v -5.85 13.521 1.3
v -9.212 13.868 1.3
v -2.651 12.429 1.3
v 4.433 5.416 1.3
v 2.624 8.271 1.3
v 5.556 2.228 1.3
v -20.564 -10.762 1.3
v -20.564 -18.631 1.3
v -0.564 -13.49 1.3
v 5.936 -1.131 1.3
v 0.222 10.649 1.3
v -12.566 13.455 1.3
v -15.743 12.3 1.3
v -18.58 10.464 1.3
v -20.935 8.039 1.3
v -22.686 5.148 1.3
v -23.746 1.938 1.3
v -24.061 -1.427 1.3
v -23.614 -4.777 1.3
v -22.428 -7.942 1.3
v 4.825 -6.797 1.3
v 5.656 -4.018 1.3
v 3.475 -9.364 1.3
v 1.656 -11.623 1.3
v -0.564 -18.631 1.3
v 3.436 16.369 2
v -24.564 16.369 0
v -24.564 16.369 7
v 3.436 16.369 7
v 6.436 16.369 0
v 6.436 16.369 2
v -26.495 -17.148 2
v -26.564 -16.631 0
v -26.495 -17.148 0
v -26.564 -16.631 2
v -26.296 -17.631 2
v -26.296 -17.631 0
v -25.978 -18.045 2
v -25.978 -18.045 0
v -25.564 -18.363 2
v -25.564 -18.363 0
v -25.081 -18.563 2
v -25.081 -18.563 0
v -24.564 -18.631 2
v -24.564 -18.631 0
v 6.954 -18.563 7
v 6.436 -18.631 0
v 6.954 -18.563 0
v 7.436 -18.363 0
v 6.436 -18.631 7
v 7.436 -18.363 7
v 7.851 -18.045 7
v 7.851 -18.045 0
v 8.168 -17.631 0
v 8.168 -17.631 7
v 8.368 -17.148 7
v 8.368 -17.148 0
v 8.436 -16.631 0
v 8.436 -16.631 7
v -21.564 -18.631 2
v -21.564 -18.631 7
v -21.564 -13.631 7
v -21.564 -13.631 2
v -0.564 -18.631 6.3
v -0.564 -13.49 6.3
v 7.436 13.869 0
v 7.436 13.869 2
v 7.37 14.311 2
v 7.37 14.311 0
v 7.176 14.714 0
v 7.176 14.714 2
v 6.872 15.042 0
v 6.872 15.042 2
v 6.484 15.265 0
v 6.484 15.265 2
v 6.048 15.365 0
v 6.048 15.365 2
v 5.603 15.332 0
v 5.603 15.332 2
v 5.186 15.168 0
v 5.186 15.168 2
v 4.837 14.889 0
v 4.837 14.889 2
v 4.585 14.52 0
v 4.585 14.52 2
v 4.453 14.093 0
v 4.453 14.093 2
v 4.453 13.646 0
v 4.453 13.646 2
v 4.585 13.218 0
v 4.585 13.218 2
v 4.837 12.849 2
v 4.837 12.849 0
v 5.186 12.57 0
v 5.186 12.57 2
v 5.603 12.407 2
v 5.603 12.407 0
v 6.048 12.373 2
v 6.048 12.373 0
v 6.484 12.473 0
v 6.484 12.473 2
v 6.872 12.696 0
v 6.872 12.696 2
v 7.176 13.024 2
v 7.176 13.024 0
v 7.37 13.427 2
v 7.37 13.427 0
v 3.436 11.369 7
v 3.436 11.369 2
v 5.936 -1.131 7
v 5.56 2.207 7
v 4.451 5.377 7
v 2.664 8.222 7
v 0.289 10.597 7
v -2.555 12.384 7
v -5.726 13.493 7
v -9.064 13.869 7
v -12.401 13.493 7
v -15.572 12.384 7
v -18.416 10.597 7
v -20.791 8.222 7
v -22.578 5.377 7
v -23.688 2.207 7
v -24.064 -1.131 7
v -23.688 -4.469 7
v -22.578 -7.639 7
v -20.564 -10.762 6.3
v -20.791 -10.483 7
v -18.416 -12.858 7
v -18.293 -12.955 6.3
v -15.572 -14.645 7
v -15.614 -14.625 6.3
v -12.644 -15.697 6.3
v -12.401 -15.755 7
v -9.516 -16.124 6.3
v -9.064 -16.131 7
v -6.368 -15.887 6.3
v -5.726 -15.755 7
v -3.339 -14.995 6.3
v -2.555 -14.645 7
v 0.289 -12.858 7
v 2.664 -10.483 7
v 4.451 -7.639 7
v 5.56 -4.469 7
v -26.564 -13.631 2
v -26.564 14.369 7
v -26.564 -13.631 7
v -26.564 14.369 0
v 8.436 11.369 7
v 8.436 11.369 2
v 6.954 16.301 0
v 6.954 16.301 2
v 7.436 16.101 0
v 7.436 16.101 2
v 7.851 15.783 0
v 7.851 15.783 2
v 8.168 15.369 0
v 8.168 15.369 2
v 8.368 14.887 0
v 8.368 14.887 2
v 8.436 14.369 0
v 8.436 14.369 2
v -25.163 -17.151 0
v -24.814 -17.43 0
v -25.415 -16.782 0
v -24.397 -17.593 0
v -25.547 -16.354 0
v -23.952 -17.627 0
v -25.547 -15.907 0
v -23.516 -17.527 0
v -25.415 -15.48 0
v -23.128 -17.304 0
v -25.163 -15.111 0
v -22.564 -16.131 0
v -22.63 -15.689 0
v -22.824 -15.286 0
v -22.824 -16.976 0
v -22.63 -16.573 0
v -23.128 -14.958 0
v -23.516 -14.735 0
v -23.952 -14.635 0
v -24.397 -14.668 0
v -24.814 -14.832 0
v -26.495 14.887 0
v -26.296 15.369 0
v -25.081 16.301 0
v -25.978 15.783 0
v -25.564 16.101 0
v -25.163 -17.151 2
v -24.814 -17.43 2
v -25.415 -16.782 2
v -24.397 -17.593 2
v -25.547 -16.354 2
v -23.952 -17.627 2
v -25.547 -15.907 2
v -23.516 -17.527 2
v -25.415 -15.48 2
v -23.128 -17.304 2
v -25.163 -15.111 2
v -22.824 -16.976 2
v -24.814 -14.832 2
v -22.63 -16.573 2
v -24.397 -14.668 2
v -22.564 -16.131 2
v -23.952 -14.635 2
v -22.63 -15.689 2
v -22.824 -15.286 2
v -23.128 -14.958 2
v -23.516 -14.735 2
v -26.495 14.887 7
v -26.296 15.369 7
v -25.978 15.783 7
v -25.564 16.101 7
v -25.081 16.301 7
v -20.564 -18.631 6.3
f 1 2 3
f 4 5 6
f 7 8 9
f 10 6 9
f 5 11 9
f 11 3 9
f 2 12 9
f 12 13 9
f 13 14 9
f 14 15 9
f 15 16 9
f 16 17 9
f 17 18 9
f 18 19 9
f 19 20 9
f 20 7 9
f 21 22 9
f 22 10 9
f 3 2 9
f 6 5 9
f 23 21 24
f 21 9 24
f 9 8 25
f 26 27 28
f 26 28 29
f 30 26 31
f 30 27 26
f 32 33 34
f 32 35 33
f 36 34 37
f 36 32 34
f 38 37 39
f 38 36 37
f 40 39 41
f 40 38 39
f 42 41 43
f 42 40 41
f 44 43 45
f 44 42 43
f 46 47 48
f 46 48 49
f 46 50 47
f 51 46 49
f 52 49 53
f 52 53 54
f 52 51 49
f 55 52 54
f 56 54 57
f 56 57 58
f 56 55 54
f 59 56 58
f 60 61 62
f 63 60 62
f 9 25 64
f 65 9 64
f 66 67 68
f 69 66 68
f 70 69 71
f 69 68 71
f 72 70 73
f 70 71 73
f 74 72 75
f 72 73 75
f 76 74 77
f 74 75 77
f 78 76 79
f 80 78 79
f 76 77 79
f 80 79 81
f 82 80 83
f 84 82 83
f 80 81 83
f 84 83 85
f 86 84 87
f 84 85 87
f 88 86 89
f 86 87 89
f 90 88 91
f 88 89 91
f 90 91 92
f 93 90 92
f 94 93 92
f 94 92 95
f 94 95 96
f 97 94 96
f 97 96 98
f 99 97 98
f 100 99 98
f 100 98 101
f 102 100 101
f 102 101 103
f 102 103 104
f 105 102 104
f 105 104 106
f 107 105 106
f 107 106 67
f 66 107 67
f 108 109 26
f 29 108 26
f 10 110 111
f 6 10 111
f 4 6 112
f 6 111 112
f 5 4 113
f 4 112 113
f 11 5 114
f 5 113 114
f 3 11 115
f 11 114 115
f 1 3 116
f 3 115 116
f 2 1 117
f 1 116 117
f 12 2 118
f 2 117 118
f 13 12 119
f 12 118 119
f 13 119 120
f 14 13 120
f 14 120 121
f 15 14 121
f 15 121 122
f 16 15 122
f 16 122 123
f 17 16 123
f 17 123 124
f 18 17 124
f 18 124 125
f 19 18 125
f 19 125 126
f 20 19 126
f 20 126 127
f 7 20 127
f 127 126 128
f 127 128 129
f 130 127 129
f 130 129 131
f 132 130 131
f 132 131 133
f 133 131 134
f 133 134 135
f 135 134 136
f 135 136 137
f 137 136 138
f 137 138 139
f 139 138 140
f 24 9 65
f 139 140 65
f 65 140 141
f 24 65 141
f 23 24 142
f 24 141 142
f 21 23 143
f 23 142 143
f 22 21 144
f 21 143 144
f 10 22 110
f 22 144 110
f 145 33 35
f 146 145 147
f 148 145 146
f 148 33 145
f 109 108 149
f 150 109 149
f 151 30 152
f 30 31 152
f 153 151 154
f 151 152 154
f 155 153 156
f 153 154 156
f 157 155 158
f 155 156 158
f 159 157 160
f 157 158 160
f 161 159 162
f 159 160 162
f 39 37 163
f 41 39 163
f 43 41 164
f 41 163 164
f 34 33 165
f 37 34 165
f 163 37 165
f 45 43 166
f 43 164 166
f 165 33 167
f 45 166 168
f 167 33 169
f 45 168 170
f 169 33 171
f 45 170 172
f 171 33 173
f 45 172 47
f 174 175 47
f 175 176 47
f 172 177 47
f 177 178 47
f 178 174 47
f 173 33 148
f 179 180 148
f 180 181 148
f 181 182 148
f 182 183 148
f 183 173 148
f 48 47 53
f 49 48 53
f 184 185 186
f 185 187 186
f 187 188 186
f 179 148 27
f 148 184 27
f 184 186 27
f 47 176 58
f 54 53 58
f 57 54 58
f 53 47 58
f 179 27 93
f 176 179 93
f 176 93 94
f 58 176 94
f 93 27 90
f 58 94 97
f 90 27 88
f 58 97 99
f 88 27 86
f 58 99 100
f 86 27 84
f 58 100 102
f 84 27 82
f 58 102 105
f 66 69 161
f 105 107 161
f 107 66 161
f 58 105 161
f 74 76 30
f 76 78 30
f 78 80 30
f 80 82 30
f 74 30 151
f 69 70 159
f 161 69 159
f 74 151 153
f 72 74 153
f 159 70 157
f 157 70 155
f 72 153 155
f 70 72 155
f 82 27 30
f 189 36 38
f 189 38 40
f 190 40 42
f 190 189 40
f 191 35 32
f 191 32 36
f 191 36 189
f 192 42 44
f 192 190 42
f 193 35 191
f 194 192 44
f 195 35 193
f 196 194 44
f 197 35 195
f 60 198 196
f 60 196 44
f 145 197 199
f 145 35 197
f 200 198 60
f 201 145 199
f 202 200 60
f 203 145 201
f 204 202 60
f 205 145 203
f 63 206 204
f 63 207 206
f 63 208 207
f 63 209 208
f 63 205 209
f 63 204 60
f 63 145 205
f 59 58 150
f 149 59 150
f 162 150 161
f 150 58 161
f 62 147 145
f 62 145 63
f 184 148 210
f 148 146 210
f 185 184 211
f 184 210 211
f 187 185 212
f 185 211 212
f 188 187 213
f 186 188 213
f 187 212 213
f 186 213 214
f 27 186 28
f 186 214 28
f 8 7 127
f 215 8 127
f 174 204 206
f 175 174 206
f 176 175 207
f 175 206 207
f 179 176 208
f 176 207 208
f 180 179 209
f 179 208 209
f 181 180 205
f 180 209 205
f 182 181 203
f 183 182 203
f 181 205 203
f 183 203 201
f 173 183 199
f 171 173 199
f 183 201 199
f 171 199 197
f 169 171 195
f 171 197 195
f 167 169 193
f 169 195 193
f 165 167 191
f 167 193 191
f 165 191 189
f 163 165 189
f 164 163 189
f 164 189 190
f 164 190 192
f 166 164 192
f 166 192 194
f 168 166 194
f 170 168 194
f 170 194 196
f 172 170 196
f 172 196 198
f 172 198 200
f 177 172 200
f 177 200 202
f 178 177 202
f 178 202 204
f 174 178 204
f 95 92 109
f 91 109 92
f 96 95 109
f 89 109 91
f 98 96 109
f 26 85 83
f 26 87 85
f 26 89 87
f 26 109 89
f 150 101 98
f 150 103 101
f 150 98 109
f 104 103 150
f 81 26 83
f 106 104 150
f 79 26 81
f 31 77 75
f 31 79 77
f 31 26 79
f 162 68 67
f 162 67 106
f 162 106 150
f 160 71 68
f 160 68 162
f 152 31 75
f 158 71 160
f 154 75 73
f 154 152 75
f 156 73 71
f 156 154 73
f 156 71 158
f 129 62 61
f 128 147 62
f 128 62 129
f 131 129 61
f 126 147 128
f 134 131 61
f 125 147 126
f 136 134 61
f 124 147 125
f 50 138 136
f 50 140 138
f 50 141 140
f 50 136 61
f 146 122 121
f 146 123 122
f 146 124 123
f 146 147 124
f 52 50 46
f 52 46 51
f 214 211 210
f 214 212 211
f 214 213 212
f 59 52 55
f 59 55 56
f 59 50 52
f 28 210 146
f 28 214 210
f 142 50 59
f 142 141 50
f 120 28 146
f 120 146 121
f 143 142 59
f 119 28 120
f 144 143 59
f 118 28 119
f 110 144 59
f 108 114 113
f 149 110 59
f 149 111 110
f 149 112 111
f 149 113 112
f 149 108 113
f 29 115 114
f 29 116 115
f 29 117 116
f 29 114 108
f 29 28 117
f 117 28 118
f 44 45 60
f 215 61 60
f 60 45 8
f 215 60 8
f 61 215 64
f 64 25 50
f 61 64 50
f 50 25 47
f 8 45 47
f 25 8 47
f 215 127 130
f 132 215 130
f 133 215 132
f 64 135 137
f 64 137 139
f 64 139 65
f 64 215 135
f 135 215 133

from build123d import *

# Parameters (mm, degrees)
F0_W     = 35
F0_H     = 35
F1_DEPTH = 7
F2_W     = 5
F2_H     = 5
F3_DEPTH = 5
F4_R     = 15
F5_DEPTH = 5.7
F6_R     = 1.5
F7_DEPTH = 25
F8_W     = 20
F8_H     = 5
F9_DEPTH = 10
F10_R    = 2


with BuildPart() as f1:
    # F0 (on Top) → F1 (new body)
    with BuildSketch(Plane.XY):
        with Locations((-9.063598, -1.130828)):
            Rectangle(F0_W, F0_H)
    extrude(amount=F1_DEPTH)

    # F2 (on face) → F3 (cut)
    with BuildSketch(Plane.XY.offset(7)):
        with Locations((-24.063598, -16.130828)):
            Rectangle(F2_W, F2_H)
        with Locations((5.936402, 13.869172)):
            Rectangle(F2_W, F2_H)
    extrude(amount=-F3_DEPTH, mode=Mode.SUBTRACT)

    # F4 (on face) → F5 (cut)
    with BuildSketch(Plane.XY.offset(7)):
        with Locations((-9.063598, -1.130828)):
            Circle(F4_R)
    extrude(amount=-F5_DEPTH, mode=Mode.SUBTRACT)

    # F6 (on face) → F7 (cut)
    with BuildSketch(Plane.XY.offset(2)):
        with Locations((-24.063598, -16.130828)):
            Circle(F6_R)
        with Locations((5.936402, 13.869172)):
            Circle(F6_R)
    extrude(amount=-F7_DEPTH, mode=Mode.SUBTRACT)

    # F8 (on face) → F9 (cut)
    with BuildSketch(Plane.XZ.offset(18.630828)):
        with Locations((-10.563598, 3.8)):
            Rectangle(F8_W, F8_H)
    extrude(amount=-F9_DEPTH, mode=Mode.SUBTRACT)

    # F10
    f10_edges = [f1.edges().sort_by_distance(p)[0] for p in [
        (8.436402, -18.630828, 3.5),
        (-26.563598, -18.630828, 1),
        (8.436402, 16.369172, 1),
        (-26.563598, 16.369172, 3.5),
    ]]
    fillet(f10_edges, radius=F10_R)


solid = f1.part
